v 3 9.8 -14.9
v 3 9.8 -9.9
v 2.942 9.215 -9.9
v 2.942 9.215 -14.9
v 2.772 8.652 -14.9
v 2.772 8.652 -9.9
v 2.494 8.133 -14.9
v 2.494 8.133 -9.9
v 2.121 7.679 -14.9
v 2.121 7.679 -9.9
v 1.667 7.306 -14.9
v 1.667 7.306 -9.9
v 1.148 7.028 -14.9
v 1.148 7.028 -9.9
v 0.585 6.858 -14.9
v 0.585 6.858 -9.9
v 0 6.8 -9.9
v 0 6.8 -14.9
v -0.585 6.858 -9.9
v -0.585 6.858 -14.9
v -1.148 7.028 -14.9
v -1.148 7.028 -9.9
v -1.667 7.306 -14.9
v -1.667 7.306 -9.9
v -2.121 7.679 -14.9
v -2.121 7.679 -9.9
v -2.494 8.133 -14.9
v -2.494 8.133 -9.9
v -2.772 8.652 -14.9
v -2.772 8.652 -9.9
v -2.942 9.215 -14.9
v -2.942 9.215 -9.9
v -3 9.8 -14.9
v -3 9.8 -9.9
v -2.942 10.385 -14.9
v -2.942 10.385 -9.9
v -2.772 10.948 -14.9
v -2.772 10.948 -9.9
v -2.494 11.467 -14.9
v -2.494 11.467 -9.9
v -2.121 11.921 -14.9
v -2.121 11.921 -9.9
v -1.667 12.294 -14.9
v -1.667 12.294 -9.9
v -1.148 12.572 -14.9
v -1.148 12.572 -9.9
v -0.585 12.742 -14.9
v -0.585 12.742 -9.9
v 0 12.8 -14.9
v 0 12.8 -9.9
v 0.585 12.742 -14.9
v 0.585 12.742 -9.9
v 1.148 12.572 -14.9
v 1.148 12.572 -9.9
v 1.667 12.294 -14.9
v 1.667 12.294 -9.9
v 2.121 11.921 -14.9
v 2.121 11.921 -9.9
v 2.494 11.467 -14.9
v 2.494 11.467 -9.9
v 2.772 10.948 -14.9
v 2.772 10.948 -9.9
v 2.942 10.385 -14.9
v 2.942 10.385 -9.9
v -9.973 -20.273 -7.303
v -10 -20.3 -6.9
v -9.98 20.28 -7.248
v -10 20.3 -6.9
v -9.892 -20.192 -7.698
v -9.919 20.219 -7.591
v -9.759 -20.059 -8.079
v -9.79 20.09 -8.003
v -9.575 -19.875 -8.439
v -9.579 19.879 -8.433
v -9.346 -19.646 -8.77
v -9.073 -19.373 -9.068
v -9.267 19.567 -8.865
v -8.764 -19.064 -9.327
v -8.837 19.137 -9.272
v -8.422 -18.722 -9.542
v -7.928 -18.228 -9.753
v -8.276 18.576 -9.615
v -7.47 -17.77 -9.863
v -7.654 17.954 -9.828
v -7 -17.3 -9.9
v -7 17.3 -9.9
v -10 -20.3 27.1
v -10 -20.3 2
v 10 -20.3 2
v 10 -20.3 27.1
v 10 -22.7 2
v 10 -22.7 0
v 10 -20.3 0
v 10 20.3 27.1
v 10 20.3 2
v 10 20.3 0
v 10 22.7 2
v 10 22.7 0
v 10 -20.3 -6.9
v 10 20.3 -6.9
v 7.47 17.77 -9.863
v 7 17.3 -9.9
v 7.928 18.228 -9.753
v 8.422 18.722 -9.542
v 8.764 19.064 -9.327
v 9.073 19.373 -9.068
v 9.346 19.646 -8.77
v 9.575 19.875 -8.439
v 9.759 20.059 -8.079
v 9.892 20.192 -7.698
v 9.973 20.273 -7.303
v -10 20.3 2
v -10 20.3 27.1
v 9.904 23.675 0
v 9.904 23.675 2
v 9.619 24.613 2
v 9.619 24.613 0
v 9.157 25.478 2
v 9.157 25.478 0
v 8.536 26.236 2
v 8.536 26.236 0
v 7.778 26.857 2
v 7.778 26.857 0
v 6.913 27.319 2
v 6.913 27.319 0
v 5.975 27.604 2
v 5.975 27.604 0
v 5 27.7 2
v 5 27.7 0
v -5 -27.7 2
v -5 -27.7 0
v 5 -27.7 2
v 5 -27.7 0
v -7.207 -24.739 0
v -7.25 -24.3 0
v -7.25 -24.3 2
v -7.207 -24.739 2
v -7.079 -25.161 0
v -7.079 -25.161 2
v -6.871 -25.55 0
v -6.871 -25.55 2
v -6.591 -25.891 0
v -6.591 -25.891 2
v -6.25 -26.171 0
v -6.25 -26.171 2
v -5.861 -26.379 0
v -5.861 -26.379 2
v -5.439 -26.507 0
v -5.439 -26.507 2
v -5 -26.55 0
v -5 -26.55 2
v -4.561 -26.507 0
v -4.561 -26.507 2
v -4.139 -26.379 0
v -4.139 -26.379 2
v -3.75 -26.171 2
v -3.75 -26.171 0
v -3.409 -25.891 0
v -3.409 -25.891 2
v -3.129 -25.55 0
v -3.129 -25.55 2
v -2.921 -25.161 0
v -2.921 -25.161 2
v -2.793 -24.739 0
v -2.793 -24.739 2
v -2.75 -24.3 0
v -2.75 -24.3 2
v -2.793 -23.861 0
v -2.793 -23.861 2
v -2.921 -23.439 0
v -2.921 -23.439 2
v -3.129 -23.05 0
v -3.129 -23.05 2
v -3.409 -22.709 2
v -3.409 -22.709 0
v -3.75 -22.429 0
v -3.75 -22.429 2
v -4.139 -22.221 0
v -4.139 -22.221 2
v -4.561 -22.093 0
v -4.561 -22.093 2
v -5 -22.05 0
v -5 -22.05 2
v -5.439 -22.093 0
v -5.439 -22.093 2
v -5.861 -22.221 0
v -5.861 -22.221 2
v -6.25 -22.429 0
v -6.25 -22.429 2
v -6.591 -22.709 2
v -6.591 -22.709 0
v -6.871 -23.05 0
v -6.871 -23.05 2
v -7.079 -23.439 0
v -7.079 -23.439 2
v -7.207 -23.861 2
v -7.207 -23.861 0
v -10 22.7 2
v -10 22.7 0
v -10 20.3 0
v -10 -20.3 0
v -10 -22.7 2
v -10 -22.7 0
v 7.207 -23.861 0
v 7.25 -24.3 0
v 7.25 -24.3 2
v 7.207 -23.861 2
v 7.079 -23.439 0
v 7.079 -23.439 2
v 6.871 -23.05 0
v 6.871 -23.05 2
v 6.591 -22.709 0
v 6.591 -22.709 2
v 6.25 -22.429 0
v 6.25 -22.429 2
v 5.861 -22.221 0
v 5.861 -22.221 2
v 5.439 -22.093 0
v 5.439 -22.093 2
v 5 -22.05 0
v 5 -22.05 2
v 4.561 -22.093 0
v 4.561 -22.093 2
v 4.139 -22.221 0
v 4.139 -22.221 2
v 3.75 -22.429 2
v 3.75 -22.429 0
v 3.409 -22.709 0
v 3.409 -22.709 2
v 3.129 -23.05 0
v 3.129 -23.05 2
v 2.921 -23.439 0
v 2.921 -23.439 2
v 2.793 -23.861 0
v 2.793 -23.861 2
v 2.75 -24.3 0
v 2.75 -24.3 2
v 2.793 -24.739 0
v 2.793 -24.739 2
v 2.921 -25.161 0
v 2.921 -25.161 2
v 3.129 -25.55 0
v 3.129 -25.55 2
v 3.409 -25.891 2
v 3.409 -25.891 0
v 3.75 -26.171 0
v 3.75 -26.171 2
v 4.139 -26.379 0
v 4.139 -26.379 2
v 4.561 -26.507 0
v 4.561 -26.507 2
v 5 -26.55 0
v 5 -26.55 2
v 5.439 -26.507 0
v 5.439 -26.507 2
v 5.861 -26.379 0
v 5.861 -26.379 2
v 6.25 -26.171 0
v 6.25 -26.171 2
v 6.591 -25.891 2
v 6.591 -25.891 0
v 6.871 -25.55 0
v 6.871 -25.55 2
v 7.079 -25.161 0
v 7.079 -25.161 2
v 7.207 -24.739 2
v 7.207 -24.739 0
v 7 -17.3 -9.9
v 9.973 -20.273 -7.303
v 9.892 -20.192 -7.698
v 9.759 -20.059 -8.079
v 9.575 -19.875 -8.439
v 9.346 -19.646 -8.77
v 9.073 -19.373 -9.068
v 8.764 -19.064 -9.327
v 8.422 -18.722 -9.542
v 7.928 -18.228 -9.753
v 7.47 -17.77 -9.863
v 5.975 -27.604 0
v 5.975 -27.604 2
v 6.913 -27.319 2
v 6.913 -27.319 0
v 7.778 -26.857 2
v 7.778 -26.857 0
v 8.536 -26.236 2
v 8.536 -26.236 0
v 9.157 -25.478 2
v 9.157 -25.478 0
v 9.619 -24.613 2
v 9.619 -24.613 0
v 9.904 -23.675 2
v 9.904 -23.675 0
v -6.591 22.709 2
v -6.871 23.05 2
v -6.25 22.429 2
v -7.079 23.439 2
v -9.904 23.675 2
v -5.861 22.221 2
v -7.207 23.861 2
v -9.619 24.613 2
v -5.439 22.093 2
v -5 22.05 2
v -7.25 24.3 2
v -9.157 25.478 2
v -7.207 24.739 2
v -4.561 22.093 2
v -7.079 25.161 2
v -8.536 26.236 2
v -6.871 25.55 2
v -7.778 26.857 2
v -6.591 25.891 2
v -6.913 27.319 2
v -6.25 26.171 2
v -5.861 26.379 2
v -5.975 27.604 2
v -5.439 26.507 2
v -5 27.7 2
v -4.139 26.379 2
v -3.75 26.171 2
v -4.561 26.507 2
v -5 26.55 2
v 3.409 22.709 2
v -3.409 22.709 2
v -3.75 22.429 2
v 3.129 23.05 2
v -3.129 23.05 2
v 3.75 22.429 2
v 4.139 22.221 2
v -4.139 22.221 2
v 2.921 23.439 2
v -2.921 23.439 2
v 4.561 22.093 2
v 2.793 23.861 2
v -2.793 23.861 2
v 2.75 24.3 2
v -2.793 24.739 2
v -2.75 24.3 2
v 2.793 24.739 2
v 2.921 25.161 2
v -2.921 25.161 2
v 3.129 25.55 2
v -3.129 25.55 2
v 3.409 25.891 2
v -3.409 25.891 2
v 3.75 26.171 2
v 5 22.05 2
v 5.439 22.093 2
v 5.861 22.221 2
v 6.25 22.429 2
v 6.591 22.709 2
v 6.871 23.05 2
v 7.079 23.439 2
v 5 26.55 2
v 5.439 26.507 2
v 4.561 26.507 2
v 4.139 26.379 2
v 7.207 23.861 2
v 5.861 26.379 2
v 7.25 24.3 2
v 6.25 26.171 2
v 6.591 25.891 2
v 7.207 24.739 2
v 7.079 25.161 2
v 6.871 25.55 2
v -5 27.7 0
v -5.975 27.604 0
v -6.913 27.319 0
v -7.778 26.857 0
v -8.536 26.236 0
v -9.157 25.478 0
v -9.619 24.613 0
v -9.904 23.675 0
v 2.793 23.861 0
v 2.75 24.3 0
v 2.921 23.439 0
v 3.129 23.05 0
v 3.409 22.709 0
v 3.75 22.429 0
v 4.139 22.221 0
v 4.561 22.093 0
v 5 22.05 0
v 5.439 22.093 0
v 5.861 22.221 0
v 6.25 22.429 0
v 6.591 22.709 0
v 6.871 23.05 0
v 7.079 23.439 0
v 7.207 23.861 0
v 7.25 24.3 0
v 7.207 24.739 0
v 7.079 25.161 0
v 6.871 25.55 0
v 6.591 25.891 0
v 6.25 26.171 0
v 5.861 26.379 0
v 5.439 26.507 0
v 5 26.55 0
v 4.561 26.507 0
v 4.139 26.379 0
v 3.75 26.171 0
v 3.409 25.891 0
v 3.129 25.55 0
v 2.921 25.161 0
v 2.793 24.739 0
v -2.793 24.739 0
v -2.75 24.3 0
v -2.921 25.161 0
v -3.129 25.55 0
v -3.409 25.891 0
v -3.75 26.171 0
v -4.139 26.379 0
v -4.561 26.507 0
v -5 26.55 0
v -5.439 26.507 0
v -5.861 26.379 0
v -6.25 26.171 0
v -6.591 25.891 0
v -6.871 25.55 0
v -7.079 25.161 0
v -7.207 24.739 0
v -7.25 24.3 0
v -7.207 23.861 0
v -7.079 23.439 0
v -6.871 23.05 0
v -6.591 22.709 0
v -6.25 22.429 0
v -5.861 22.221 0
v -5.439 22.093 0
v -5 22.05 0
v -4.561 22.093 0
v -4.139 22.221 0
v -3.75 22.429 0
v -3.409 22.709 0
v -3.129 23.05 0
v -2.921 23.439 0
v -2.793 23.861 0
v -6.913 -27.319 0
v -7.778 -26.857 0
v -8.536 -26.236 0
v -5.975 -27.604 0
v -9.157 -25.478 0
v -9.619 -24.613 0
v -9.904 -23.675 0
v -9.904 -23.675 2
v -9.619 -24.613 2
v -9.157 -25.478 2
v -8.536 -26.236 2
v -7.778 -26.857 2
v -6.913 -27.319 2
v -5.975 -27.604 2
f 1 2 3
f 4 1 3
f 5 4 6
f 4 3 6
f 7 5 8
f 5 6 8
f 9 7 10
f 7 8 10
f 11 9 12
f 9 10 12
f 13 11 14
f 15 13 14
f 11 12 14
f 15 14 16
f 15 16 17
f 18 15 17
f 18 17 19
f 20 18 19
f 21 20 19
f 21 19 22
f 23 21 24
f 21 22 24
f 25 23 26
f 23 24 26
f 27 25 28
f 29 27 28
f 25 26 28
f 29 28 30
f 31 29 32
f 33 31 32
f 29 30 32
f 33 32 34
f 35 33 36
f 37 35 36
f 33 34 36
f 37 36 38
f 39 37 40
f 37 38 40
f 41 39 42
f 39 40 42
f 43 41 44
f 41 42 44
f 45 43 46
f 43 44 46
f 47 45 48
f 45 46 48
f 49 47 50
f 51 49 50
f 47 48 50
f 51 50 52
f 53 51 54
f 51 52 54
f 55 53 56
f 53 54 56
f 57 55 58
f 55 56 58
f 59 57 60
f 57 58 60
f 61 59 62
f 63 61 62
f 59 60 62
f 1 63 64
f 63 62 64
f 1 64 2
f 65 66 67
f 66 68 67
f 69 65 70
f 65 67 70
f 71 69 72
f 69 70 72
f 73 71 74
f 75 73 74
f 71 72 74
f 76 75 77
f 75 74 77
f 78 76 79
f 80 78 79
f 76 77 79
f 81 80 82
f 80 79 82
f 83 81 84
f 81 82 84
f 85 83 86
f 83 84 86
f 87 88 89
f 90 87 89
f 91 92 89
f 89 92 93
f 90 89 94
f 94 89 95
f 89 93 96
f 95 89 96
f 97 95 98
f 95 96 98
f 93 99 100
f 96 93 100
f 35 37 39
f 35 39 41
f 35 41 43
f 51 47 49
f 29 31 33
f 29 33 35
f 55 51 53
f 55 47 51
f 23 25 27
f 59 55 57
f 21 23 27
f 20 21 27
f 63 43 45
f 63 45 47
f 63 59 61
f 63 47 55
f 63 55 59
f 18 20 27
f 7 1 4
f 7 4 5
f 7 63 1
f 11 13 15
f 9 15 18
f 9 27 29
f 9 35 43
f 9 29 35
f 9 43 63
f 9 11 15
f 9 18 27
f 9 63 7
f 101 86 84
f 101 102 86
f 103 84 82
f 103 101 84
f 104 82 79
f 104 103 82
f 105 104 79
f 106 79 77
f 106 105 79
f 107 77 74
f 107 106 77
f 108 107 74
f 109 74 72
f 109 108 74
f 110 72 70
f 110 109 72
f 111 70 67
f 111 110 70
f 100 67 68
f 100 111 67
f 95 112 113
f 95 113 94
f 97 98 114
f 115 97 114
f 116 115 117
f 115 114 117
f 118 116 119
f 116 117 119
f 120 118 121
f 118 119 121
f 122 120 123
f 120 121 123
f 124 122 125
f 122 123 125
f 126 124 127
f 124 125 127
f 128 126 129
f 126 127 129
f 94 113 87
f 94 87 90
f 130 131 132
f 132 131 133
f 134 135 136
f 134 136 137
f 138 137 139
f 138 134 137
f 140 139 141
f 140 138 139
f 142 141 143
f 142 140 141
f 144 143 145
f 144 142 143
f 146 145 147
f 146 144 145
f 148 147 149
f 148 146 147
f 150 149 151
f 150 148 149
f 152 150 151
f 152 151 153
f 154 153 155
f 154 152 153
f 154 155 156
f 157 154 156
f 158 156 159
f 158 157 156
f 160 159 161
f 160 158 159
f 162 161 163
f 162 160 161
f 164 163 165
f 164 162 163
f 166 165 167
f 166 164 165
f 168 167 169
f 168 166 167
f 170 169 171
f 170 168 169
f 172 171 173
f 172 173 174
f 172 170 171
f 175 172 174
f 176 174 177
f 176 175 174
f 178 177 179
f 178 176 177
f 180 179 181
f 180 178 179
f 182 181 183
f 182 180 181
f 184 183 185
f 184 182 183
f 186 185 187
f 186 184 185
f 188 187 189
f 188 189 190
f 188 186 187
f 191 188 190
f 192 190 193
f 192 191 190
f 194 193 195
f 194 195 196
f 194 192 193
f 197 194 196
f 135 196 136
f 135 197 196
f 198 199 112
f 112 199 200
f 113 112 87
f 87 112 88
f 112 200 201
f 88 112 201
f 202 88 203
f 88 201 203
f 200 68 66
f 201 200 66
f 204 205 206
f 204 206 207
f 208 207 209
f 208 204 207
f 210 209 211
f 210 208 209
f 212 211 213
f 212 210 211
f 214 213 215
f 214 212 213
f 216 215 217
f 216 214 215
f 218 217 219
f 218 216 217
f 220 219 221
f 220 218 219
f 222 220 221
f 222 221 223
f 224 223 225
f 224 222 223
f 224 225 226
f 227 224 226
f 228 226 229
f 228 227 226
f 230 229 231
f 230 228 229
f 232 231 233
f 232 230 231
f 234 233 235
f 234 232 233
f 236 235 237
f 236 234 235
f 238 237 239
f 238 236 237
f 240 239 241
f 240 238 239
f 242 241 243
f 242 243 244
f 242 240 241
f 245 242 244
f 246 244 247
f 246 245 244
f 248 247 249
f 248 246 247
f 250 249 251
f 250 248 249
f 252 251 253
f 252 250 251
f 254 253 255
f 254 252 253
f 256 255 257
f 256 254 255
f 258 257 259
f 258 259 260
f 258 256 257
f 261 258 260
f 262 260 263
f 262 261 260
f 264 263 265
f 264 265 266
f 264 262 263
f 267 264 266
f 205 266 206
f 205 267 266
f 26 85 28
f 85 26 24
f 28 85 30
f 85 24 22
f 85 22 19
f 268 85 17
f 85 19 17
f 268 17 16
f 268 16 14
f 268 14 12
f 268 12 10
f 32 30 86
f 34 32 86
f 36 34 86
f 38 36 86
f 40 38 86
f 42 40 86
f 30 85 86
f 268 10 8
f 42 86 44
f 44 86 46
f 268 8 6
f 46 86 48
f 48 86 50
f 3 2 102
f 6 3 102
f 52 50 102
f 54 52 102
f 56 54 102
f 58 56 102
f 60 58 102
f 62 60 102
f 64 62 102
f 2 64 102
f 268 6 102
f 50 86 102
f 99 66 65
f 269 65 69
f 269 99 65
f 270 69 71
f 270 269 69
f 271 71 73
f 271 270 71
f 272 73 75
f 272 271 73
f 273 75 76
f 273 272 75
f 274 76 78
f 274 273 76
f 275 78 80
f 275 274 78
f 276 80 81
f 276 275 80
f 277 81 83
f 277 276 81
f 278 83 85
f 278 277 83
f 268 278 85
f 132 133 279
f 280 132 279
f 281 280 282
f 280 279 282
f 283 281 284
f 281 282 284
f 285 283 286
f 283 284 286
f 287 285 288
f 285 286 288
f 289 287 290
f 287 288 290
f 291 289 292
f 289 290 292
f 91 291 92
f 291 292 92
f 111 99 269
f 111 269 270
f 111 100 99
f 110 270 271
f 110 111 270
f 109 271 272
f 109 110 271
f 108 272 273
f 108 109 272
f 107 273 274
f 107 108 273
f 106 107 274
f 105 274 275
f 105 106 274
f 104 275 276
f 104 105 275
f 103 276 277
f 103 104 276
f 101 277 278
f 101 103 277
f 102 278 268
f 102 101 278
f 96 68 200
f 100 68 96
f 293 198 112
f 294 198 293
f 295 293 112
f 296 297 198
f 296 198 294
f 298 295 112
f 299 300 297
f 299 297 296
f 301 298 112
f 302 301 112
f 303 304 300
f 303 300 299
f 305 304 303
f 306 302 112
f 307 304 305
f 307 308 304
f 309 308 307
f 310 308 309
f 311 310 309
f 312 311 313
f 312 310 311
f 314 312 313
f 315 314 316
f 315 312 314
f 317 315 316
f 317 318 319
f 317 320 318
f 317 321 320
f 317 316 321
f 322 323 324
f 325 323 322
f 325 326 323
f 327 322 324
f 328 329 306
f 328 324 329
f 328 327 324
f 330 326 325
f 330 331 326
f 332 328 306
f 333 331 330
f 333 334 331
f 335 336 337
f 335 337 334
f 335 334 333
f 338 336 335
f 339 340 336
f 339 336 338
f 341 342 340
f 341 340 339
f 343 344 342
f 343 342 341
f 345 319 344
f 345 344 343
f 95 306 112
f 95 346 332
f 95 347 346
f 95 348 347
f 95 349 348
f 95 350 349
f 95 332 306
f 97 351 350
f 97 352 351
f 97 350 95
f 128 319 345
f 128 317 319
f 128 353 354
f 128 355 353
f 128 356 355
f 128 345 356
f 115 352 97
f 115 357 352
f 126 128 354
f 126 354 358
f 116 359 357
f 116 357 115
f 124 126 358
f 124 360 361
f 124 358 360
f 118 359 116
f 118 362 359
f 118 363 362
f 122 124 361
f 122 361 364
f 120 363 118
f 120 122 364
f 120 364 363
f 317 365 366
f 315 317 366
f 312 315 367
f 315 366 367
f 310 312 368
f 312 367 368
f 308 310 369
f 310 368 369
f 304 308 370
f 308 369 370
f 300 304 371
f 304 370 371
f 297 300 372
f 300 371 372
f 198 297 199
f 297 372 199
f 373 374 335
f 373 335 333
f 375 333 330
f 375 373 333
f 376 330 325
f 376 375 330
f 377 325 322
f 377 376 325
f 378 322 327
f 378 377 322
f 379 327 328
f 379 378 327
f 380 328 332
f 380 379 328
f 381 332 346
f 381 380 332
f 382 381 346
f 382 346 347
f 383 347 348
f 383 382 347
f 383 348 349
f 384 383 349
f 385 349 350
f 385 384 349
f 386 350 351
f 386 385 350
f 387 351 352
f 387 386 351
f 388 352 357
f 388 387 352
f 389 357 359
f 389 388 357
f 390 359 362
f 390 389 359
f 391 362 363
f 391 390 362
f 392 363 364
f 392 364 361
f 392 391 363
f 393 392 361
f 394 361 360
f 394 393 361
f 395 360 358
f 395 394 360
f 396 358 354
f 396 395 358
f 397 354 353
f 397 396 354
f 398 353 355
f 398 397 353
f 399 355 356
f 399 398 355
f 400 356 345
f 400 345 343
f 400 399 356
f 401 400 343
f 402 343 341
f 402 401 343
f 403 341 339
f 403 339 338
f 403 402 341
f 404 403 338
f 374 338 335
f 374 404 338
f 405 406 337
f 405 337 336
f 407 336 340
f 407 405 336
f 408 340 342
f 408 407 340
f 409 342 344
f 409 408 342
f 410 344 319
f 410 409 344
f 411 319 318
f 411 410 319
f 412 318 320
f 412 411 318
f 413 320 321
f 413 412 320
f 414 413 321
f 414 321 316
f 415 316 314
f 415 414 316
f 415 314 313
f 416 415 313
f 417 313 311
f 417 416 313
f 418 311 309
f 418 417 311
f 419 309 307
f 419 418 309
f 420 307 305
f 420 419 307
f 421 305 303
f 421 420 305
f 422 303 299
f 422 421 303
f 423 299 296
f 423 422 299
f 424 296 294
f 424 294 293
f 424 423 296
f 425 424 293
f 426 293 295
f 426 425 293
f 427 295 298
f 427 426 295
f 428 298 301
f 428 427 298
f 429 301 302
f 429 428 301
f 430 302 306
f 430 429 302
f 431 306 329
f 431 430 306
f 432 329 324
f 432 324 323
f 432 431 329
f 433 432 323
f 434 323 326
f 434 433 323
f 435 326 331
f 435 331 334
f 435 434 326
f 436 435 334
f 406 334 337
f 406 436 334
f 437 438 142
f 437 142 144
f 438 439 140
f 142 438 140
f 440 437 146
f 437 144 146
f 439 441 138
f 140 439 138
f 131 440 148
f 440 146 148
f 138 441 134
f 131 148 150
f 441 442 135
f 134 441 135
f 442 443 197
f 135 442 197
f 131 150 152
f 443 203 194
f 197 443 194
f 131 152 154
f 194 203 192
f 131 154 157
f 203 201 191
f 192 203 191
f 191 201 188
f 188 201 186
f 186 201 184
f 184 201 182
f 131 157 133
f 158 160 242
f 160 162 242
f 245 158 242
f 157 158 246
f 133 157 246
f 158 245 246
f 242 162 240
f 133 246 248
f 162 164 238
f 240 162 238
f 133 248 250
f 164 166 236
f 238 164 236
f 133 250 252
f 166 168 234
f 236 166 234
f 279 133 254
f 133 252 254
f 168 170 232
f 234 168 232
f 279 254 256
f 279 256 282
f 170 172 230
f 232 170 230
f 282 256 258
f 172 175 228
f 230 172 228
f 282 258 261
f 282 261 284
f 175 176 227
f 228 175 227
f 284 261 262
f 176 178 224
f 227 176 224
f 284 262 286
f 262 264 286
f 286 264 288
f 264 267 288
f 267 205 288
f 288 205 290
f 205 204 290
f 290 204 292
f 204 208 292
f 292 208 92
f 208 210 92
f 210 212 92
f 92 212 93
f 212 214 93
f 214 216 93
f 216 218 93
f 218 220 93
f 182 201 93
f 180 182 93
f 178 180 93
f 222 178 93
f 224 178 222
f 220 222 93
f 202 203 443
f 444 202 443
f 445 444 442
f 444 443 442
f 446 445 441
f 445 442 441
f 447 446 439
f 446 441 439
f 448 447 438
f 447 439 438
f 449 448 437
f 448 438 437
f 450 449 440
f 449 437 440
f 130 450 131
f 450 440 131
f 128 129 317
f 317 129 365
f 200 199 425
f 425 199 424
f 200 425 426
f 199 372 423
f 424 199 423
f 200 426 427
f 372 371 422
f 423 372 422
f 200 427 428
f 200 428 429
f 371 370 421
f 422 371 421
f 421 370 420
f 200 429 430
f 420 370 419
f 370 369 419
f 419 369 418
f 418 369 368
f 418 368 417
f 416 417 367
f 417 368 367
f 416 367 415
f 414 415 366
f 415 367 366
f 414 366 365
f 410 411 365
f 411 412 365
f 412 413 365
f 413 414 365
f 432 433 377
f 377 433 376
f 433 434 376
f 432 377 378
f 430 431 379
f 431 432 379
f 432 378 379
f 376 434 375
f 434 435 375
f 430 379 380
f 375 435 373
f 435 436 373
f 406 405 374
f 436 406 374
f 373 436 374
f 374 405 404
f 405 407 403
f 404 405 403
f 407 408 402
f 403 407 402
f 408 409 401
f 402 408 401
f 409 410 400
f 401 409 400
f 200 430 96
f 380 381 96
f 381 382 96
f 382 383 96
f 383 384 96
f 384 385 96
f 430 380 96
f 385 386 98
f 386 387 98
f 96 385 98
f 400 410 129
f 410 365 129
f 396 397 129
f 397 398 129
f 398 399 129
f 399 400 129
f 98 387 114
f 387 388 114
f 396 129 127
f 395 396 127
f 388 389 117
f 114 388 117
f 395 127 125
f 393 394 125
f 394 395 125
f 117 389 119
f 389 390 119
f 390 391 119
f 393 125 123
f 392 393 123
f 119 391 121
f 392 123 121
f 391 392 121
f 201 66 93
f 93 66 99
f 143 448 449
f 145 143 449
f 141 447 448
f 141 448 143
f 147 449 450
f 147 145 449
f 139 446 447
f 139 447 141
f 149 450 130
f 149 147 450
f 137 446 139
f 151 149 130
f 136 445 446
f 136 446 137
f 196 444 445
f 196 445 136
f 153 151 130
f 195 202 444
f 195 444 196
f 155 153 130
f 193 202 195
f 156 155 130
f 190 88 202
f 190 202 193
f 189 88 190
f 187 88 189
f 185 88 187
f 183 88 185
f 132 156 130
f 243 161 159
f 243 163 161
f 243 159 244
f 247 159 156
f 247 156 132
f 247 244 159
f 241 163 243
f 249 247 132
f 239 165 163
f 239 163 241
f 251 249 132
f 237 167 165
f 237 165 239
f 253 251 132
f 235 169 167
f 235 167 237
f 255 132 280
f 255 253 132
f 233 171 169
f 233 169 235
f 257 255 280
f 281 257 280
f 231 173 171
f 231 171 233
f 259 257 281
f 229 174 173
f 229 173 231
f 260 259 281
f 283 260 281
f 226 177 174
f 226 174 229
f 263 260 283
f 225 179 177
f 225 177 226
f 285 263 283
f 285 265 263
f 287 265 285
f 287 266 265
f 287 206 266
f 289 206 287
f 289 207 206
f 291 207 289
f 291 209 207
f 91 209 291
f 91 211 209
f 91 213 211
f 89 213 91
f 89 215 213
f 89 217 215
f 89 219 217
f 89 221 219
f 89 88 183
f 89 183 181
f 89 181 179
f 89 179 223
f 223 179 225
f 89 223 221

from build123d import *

# Parameters (mm, degrees)
BOSS_EXTRUDE1_DEPTH      = 27.1
BOSS_EXTRUDE1_DEPTH_BACK = 9.9
SKETCH2_W                = 20
SKETCH2_H                = 40.6
SKETCH1_R                = 2.83646338
SKETCH1_R_2              = 2.25
BOSS_EXTRUDE2_DEPTH      = 2
FILLET1_R                = 3
SKETCH3_R                = 3
BOSS_EXTRUDE3_DEPTH      = 5


with BuildPart() as part:
    # Sketch2 → Boss-Extrude1 (new, two sides: drawn at the far end of the back side and taken through both)
    with BuildSketch(Plane.XY.offset(-BOSS_EXTRUDE1_DEPTH_BACK)):
        Rectangle(SKETCH2_W, SKETCH2_H)
    extrude(amount=BOSS_EXTRUDE1_DEPTH + BOSS_EXTRUDE1_DEPTH_BACK)

    # Sketch1 → Boss-Extrude2 (add)
    with BuildSketch(Plane.XY):
        with BuildLine():
            Line((-5, -27.7), (5, -27.7))
            ThreePointArc((5, -27.7), (8.535533906, -26.235533906), (10, -22.7))
            Line((10, -22.7), (10, 22.7))
            ThreePointArc((10, 22.7), (8.535533906, 26.235533906), (5, 27.7))
            Line((5, 27.7), (-5, 27.7))
            ThreePointArc((-5, 27.7), (-8.535533906, 26.235533906), (-10, 22.7))
            Line((-10, 22.7), (-10, -22.7))
            ThreePointArc((-10, -22.7), (-8.535533906, -26.235533906), (-5, -27.7))
        make_face()
        with Locations((0, 9.8)):
            Circle(SKETCH1_R, mode=Mode.SUBTRACT)
        with Locations((-5, 24.3)):
            Circle(SKETCH1_R_2, mode=Mode.SUBTRACT)
        with Locations(Location((5, 24.3, 0), (0, 0, 180))):
            Circle(SKETCH1_R_2, mode=Mode.SUBTRACT)
        with Locations((5, -24.3)):
            Circle(SKETCH1_R_2, mode=Mode.SUBTRACT)
        with Locations(Location((-5, -24.3, 0), (0, 0, 180))):
            Circle(SKETCH1_R_2, mode=Mode.SUBTRACT)
    extrude(amount=BOSS_EXTRUDE2_DEPTH)

    # Fillet1
    fillet1_edges = [part.edges().sort_by_distance(p)[0] for p in [
        (10, 0, -9.9),
        (0, 20.3, -9.9),
        (-10, 0, -9.9),
        (0, -20.3, -9.9),
    ]]
    fillet(fillet1_edges, radius=FILLET1_R)

    # Sketch3 → Boss-Extrude3 (add)
    with BuildSketch(Plane(origin=(0, 0, -9.9), x_dir=(-1, 0, 0), z_dir=(0, 0, -1))):
        with Locations(Location((0, 9.8, 0), (0, 0, 180))):
            Circle(SKETCH3_R)
    extrude(amount=BOSS_EXTRUDE3_DEPTH)


solid = part.part
